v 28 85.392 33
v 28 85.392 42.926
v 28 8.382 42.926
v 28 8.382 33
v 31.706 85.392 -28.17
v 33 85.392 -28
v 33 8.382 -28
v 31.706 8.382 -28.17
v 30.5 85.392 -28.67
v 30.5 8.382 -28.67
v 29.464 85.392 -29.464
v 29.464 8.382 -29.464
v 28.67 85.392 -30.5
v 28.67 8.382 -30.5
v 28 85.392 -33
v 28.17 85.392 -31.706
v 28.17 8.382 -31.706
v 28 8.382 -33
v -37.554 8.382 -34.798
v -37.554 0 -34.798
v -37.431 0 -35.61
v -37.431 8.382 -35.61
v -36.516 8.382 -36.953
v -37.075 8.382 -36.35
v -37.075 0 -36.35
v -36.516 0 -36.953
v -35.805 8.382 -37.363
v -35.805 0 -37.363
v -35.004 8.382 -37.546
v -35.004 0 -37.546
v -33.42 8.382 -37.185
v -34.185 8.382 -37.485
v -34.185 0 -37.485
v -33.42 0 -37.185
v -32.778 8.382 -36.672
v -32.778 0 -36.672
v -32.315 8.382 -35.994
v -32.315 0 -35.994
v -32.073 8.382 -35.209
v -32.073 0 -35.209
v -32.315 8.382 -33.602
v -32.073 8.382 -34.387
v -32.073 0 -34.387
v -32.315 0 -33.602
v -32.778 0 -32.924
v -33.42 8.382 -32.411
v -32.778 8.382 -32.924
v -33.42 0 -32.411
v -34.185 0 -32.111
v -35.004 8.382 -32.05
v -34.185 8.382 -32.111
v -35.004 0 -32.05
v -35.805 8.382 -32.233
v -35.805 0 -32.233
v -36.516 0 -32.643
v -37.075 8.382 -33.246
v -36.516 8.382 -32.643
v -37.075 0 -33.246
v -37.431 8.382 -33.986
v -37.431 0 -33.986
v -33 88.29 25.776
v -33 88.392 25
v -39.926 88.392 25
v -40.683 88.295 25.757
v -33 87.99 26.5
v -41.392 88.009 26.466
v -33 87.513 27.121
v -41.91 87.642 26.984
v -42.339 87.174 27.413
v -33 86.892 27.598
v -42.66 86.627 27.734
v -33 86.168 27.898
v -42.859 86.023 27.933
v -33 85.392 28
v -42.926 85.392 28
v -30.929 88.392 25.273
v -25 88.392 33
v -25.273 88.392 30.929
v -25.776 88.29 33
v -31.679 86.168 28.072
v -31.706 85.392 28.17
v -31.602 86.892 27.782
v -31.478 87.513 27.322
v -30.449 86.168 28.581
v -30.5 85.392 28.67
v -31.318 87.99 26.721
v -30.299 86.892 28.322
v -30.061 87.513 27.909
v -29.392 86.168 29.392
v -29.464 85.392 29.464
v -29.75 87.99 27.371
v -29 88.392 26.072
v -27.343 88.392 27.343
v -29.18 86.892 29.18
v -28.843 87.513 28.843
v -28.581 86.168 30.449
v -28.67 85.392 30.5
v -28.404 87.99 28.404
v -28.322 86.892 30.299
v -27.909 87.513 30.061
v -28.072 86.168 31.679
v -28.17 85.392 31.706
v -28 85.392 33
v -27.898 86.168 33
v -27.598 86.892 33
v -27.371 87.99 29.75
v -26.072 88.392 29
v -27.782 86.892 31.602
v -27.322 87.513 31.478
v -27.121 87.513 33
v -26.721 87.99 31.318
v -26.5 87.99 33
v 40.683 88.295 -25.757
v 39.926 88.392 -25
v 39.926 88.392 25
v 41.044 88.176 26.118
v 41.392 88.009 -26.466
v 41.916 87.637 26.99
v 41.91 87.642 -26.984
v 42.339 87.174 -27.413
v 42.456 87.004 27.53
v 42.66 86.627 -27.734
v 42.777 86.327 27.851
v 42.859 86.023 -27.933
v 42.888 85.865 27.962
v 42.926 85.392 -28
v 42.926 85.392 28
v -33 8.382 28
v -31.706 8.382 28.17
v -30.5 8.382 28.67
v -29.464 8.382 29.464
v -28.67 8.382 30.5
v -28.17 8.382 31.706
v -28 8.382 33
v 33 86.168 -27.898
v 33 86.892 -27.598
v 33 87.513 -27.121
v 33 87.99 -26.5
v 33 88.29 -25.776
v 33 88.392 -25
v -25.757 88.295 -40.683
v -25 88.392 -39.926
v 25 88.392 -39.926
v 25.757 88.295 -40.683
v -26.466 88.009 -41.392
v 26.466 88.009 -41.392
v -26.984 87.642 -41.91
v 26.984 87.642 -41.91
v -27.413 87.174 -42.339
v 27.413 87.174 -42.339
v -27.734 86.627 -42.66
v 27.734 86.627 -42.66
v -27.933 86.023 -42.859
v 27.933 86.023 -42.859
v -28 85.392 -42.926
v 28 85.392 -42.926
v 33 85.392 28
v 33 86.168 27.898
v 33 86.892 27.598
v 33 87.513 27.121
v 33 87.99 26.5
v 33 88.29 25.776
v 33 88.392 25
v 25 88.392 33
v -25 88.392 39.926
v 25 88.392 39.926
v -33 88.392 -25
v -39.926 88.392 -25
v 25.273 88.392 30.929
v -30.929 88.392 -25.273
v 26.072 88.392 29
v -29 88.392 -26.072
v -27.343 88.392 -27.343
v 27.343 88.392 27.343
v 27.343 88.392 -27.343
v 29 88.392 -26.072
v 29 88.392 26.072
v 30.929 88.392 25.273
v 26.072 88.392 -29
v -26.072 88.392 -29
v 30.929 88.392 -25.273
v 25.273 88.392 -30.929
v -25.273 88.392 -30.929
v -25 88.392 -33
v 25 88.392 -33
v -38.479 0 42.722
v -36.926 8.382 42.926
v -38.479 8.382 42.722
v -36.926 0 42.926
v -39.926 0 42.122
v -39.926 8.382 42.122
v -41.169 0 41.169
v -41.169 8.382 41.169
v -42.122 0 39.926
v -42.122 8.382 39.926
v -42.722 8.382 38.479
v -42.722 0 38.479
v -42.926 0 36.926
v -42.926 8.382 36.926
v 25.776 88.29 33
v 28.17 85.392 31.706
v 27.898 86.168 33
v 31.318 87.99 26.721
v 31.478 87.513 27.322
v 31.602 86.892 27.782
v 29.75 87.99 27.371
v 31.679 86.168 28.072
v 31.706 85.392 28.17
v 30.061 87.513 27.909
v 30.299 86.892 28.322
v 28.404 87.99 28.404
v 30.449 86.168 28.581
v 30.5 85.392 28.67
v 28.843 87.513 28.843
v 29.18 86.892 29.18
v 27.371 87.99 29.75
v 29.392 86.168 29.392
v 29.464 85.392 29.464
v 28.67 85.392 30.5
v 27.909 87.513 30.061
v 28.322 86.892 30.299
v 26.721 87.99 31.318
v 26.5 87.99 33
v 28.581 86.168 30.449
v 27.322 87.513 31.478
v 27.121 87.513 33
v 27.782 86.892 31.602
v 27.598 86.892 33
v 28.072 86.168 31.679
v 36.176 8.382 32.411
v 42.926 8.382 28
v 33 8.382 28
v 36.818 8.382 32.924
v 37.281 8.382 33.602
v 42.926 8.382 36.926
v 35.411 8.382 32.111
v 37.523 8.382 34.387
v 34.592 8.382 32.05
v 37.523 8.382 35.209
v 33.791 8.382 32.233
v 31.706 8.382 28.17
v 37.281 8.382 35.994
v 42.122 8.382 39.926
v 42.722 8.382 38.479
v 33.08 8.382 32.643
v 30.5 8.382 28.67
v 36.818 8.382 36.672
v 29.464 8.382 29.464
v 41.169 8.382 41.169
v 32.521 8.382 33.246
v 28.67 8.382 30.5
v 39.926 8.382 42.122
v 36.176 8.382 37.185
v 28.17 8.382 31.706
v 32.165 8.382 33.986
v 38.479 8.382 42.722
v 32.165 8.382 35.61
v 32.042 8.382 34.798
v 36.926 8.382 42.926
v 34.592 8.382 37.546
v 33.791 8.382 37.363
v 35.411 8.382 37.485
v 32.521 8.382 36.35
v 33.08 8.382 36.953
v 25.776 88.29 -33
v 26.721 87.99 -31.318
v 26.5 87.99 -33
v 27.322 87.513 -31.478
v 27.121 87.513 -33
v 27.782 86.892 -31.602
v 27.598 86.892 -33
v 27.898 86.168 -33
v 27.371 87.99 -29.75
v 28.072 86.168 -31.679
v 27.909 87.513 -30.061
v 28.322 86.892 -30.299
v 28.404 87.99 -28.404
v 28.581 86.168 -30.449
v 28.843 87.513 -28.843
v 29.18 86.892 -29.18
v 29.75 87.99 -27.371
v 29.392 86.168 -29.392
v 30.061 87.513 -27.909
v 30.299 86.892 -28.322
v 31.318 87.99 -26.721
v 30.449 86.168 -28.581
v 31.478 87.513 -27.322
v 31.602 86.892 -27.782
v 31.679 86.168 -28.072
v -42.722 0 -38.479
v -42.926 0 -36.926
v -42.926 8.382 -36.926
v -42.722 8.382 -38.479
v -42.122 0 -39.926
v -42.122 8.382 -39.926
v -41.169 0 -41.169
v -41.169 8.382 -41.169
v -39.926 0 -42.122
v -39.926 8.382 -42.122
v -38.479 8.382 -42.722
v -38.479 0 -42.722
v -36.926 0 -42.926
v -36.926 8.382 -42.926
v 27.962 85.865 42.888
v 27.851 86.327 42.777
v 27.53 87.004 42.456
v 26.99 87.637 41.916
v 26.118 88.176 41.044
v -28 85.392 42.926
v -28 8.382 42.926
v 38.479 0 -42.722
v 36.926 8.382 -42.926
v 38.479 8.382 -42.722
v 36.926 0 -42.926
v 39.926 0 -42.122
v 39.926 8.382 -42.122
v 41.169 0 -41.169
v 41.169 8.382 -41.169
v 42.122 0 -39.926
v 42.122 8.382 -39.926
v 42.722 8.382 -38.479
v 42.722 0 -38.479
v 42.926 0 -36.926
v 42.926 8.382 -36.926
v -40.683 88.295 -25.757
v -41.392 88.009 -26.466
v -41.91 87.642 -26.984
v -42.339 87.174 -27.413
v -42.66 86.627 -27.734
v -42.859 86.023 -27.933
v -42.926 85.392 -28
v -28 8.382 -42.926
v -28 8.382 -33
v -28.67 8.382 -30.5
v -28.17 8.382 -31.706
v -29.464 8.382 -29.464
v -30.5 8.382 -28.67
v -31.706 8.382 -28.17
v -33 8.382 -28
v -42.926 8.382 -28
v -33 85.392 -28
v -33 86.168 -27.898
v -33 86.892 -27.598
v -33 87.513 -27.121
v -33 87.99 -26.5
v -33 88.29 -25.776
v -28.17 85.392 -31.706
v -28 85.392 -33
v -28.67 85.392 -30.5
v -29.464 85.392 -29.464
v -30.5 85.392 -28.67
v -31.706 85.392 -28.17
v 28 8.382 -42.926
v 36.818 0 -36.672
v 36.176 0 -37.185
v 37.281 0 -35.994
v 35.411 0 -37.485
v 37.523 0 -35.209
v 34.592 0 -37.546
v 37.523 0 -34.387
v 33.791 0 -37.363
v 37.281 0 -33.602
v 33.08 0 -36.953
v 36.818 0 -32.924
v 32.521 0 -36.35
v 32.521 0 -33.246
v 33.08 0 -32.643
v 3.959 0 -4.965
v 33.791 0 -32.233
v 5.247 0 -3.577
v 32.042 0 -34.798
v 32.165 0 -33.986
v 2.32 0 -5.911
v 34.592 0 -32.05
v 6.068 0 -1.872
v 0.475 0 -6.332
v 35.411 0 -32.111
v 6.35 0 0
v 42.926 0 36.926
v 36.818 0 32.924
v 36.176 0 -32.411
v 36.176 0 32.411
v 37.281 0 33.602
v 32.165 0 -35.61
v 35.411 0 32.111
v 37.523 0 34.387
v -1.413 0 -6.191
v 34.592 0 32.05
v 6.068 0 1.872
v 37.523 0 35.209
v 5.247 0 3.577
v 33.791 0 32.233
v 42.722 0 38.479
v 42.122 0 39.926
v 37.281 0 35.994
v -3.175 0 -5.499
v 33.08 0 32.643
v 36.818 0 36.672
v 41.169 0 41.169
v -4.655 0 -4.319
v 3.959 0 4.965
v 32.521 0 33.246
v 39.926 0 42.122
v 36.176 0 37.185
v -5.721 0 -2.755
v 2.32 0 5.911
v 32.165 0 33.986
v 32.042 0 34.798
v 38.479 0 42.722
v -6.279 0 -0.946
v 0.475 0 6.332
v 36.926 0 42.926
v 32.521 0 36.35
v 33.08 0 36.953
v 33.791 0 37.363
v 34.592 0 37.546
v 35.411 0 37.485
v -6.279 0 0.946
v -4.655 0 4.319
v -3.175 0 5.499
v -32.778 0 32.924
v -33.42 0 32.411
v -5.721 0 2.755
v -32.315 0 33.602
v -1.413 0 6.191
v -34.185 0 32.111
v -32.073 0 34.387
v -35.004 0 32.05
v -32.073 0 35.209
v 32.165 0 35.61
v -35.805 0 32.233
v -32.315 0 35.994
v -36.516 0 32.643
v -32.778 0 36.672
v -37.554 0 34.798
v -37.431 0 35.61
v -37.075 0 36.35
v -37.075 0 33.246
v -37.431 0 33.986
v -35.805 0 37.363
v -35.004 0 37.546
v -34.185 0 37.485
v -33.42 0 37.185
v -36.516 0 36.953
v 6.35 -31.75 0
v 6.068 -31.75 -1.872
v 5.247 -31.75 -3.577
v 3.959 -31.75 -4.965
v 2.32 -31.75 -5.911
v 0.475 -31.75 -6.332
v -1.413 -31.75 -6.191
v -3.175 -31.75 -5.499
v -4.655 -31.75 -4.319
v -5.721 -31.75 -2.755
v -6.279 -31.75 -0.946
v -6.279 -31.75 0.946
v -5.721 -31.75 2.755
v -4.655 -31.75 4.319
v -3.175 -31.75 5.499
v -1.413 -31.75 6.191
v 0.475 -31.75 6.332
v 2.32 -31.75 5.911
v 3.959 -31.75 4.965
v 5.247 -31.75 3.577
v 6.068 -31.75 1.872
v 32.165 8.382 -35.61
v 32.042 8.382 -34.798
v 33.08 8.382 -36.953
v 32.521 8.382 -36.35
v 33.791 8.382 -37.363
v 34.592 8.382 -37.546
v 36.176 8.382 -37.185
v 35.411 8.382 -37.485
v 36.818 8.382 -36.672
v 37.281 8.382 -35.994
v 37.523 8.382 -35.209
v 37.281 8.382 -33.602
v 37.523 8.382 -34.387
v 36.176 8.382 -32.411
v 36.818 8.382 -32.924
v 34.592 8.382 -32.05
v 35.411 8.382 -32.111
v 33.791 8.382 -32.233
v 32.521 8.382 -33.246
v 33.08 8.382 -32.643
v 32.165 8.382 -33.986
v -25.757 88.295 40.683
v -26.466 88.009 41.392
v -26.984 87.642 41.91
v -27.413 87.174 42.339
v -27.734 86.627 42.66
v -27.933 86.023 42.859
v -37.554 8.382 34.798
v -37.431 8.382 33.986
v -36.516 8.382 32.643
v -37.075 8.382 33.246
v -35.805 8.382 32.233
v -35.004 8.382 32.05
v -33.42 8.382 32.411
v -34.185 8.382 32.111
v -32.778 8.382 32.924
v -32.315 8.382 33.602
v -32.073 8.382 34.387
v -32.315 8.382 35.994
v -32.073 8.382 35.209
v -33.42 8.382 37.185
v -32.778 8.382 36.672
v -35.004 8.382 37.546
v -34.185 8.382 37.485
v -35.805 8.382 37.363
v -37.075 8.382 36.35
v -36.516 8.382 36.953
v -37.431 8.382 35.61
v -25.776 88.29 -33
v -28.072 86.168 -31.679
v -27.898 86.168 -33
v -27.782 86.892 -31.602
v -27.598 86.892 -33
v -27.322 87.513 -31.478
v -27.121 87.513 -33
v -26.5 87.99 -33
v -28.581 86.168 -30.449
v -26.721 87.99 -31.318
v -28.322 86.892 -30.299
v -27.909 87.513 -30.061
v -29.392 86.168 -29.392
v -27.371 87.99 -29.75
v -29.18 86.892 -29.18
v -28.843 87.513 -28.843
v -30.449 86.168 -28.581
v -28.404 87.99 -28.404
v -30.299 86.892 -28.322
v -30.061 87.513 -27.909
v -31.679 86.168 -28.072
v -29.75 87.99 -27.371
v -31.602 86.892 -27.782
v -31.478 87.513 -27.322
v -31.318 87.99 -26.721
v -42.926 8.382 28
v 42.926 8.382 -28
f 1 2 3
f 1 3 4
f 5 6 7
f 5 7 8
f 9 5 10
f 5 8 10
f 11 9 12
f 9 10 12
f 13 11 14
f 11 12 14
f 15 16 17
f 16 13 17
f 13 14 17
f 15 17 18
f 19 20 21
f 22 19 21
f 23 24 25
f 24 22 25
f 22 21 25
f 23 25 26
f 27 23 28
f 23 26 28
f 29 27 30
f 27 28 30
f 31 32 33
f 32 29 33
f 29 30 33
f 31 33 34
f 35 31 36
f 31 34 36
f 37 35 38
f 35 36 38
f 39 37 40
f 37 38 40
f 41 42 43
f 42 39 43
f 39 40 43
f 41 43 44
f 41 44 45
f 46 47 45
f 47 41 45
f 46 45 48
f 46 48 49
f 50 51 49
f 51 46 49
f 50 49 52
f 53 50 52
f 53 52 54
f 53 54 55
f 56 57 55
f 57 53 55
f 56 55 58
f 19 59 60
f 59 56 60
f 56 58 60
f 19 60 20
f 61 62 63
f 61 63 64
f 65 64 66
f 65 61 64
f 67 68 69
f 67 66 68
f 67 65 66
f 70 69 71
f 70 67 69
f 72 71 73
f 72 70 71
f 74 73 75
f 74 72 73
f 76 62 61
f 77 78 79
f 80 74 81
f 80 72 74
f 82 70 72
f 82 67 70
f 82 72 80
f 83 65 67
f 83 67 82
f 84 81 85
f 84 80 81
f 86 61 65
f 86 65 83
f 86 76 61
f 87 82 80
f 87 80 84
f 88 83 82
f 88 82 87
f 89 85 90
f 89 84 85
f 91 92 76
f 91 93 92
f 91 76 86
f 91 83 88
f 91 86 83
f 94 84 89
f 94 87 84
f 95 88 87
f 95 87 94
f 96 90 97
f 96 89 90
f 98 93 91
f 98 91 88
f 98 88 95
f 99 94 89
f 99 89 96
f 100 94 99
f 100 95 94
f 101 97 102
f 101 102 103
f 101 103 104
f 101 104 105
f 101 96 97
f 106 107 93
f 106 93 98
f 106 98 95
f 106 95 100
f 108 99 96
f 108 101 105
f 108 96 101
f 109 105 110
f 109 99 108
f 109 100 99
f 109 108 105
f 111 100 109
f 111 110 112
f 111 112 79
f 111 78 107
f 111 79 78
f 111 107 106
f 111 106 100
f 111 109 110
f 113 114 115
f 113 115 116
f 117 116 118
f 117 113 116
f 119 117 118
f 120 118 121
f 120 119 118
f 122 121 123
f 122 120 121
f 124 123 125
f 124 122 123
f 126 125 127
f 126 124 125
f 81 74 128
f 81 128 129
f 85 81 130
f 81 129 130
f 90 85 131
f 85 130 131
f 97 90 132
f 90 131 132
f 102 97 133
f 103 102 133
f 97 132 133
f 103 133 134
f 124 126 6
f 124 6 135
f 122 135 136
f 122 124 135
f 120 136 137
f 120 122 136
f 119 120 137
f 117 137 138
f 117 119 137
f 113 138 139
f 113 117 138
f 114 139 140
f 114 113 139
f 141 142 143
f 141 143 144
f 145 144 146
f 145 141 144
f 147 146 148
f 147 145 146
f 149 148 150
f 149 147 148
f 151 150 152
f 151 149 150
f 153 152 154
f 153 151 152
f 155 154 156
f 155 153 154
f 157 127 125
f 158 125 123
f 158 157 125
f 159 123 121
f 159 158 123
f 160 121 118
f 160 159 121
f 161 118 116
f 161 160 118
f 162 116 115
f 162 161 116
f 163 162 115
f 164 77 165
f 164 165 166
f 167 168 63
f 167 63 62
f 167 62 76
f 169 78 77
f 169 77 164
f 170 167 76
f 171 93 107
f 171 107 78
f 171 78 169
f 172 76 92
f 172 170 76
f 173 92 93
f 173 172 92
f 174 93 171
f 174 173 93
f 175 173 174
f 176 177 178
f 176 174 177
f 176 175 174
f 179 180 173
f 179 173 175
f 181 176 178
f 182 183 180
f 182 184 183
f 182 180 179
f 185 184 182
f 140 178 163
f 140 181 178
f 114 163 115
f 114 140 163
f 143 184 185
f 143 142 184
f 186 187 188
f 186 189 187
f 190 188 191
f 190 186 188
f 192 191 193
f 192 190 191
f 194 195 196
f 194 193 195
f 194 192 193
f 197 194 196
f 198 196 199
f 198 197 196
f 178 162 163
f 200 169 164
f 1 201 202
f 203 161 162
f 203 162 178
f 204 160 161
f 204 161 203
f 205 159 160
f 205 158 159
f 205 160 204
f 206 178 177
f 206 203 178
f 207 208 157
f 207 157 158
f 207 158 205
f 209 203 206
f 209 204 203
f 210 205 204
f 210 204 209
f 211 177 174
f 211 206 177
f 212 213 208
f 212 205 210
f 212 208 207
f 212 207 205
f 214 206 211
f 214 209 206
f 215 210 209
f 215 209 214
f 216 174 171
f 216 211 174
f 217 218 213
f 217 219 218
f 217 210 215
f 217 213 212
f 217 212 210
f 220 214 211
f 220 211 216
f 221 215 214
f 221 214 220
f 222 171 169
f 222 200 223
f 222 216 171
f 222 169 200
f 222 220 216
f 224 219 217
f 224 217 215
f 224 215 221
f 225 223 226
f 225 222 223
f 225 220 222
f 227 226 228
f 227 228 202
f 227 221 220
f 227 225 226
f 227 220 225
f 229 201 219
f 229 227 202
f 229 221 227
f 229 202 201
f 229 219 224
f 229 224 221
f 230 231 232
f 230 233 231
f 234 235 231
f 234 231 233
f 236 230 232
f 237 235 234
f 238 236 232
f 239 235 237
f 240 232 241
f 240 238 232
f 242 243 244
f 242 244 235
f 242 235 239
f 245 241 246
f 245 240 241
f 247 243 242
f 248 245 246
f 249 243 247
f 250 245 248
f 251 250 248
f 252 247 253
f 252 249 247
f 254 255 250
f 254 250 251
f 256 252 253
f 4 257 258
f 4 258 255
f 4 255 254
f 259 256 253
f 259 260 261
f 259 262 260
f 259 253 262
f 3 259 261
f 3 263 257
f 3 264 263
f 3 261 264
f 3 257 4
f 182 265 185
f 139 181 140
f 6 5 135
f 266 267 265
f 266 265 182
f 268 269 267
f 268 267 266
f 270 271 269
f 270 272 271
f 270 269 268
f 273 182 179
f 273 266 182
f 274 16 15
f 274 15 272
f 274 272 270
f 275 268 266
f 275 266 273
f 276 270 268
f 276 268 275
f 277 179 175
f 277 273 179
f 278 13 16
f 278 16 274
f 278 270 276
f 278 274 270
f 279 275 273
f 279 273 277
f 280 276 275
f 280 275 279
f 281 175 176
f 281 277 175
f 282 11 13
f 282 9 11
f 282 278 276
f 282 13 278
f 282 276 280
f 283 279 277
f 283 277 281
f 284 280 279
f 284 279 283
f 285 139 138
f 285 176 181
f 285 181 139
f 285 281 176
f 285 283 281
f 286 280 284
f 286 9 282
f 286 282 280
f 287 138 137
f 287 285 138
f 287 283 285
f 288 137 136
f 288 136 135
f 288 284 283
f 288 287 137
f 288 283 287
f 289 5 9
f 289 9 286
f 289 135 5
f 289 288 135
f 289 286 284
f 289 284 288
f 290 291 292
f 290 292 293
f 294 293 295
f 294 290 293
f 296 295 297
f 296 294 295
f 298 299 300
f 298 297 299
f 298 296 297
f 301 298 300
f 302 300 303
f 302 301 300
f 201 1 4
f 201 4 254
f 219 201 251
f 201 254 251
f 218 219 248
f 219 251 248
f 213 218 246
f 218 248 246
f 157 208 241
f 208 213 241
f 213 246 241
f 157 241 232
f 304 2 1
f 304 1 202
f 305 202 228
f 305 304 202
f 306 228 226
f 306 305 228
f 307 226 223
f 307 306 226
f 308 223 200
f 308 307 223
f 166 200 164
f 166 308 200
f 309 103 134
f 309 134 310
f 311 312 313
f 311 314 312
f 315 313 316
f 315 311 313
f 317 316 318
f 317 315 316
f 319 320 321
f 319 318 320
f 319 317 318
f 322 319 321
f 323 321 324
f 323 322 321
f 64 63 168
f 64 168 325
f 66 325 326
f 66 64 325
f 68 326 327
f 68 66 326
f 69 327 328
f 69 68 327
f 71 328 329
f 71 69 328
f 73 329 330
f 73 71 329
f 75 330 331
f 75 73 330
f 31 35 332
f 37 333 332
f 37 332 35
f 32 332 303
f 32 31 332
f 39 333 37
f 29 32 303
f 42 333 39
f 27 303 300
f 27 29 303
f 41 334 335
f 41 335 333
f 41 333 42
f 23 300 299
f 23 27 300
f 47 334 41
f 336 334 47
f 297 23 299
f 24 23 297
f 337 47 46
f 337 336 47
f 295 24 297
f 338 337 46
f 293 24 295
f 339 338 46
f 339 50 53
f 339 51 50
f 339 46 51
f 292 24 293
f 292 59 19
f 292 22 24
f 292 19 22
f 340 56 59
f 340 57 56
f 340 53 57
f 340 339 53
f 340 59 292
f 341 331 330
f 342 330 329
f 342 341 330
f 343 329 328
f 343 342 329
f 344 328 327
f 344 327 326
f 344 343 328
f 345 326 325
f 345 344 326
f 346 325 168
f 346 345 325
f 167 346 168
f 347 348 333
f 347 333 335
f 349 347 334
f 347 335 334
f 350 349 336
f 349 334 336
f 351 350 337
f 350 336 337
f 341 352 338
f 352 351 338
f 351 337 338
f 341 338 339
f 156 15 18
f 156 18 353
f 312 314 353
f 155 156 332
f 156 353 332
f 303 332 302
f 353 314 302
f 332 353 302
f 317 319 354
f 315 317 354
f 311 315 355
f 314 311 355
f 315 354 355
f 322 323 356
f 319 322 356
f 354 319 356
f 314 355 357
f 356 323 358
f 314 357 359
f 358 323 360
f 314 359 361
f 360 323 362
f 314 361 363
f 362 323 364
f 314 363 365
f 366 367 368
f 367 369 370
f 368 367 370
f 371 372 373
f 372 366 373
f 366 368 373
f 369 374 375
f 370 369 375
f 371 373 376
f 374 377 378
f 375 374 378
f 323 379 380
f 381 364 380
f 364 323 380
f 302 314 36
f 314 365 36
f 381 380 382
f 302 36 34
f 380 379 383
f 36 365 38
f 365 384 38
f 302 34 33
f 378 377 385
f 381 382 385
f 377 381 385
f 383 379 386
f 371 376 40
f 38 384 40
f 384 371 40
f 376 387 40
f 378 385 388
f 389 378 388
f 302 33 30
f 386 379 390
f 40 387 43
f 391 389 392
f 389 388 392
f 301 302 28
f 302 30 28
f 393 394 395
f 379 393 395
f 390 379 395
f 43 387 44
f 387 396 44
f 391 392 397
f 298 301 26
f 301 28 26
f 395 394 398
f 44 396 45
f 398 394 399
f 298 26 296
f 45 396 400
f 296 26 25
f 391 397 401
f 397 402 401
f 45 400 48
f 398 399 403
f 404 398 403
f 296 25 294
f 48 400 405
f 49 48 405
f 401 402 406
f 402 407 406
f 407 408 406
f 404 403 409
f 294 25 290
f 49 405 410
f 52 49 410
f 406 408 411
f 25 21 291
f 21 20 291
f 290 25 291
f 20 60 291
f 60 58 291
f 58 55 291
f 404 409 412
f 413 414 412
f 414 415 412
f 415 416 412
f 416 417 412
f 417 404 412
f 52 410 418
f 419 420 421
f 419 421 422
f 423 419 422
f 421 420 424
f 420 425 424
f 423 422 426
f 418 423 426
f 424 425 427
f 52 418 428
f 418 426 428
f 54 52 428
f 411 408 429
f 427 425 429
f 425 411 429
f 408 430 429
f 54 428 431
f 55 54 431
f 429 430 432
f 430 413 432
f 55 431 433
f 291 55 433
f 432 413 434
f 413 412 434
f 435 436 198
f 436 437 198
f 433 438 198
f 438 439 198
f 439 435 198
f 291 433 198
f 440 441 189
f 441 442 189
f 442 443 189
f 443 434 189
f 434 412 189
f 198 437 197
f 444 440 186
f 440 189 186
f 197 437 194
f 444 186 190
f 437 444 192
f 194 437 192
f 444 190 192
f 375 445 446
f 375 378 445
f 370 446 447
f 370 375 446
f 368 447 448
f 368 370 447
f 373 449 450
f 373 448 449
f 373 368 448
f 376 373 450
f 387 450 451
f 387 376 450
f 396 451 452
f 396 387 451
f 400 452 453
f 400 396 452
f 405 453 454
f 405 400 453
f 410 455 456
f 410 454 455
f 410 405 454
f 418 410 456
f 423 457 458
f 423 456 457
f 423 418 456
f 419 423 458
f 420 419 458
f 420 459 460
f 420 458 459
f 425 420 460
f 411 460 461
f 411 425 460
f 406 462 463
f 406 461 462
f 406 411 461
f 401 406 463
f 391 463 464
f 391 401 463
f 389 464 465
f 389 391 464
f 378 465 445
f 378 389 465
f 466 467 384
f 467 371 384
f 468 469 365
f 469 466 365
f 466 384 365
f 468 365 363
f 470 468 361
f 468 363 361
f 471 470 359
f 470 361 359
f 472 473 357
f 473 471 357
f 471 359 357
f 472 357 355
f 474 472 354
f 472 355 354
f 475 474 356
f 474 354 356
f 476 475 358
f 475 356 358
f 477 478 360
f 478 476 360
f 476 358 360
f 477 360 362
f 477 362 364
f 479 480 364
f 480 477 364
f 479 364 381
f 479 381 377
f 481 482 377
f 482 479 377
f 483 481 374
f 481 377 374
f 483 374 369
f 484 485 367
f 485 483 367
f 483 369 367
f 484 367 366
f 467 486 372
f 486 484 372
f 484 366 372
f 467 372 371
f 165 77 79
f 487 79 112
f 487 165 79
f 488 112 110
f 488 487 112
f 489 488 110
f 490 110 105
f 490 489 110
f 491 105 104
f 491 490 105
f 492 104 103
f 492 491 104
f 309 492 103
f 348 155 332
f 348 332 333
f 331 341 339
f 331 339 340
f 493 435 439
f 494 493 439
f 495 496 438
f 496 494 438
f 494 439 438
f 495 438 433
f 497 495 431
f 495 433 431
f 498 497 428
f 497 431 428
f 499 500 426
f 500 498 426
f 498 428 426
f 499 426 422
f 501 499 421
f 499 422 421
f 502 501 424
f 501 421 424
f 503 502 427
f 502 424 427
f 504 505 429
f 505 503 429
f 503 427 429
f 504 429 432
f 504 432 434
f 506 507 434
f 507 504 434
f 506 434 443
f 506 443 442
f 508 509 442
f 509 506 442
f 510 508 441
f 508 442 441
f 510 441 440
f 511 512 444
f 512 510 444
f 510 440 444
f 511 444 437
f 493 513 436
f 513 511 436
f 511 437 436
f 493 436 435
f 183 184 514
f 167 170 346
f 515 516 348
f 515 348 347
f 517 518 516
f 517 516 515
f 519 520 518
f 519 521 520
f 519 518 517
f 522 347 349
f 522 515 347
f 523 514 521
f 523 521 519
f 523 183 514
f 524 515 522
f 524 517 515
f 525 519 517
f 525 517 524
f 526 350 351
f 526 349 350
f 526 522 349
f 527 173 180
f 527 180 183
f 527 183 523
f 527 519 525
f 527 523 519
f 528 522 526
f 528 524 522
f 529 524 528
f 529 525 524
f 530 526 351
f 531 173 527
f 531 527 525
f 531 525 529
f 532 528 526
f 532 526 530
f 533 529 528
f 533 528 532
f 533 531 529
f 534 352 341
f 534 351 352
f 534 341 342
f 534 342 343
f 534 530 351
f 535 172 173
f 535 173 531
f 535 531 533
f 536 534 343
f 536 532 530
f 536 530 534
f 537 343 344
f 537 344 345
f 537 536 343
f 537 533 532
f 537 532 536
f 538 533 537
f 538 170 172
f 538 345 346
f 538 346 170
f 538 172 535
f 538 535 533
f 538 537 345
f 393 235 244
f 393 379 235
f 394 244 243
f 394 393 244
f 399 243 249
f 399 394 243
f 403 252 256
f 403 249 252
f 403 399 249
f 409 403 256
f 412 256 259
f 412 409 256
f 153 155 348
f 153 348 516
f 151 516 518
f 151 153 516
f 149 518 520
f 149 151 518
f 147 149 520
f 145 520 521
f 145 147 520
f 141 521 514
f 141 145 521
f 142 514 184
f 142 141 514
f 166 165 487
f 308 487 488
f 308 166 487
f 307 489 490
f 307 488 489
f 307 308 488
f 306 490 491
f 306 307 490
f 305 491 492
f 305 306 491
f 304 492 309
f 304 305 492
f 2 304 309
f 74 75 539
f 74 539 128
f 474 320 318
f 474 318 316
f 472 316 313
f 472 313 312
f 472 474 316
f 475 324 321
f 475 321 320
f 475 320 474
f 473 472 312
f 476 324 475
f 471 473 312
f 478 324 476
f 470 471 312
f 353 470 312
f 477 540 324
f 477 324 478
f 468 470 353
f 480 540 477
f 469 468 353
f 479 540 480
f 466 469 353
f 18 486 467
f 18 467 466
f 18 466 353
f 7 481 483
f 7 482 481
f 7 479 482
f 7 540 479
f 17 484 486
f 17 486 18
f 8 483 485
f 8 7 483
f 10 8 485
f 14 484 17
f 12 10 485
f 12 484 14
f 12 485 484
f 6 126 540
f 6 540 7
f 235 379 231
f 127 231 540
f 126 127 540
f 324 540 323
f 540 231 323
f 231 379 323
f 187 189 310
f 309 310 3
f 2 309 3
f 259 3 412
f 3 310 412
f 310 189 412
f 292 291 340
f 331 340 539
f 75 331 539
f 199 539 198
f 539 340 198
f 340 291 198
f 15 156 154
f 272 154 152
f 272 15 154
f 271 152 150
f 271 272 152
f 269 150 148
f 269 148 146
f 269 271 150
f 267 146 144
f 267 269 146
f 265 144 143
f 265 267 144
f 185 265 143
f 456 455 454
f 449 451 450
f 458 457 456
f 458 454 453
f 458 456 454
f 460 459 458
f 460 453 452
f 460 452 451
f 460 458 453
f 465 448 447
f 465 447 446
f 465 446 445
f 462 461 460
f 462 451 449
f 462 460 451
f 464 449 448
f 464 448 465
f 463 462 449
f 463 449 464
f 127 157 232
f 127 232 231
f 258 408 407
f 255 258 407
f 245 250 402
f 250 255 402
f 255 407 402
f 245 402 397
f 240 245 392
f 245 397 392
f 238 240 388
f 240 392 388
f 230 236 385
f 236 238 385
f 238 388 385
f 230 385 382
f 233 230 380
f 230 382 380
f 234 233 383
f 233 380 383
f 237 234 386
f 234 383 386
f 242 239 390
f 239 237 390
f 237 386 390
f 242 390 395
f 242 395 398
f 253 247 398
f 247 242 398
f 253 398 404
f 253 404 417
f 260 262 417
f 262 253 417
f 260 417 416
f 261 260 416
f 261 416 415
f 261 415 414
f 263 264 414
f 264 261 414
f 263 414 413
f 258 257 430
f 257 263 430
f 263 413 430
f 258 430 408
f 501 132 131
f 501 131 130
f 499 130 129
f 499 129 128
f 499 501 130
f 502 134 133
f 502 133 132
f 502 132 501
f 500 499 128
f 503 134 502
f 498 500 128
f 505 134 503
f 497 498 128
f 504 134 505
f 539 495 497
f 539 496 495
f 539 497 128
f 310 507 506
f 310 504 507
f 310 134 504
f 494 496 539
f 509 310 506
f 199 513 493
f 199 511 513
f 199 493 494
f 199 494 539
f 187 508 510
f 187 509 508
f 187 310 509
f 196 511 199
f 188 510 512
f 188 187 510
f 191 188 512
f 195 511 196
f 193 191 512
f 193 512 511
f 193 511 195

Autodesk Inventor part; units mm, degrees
ref_plane "YZ Plane" through (0, 0, 0) normal (1, 0, 0) x (0, 1, 0)
ref_plane "XZ Plane" through (0, 0, 0) normal (0, 1, 0) x (-1, 0, 0)
ref_plane "XY Plane" through (0, 0, 0) normal (0, 0, 1) x (1, 0, 0)
sketch "Sketch1" plane through (0, 0, 0) normal (0, 1, 0) x (-1, 0, 0)
  line L0 (36.926, 42.926) -> (-36.926, 42.926)
  line L1 (-42.926, 36.926) -> (-42.926, -36.926)
  line L2 (-36.926, -42.926) -> (36.926, -42.926)
  line L3 (42.926, -36.926) -> (42.926, 36.926)
  line L4 (55, 0) -> (-75, 0) construction
  line L5 (0, 74) -> (0, -88) construction
  arc A0 (42.926, 36.926) -> (36.926, 42.926) centre (36.926, 36.926) ccw
  arc A1 (36.926, -42.926) -> (42.926, -36.926) centre (36.926, -36.926) ccw
  arc A2 (-42.926, -36.926) -> (-36.926, -42.926) centre (-36.926, -36.926) ccw
  arc A3 (-36.926, 42.926) -> (-42.926, 36.926) centre (-36.926, 36.926) ccw
  circle A4 centre (34.798, 34.798) radius 2.7559
  circle A5 centre (34.798, -34.798) radius 2.7559
  circle A6 centre (-34.798, -34.798) radius 2.7559
  circle A7 centre (-34.798, 34.798) radius 2.7559
  point P0 (0, 0)
  point P1 (42.926, 42.926)
  point P2 (42.926, -42.926)
  point P3 (42.926, 0)
  point P4 (0, -42.926)
  dimension "d0" = 85.852
  dimension "d1" = 6
  dimension "d5" = 5.5118
  dimension "d6" = 69.596
  dimension "d7" = 69.596
  dimension "d8" = 69.596
  dimension "d9" = 69.596
  dimension "d10" = 34.798
  dimension "d11" = 34.798
extrude "Extrusion1" add sketch "Sketch1" along normal blind 8.382
sketch "Sketch2" plane through (0, 8.382, 0) normal (0, 1, 0) x (1, 0, 0)
  line L0 (42.926, -28) -> (42.926, 28)
  line L1 (-42.926, 28) -> (-42.926, -28)
  line L2 (-28, -42.926) -> (28, -42.926)
  line L3 (28, 42.926) -> (-28, 42.926)
  line L4 (-42.926, 36.926) -> (-42.926, -36.926) projected
  line L5 (36.926, 42.926) -> (-36.926, 42.926) projected
  line L6 (42.926, -36.926) -> (42.926, 36.926) projected
  line L7 (-36.926, -42.926) -> (36.926, -42.926) projected
  line L8 (-42.926, -28) -> (-33, -28)
  line L9 (33, -28) -> (42.926, -28)
  line L10 (-28, 42.926) -> (-28, 33)
  line L11 (-28, -33) -> (-28, -42.926)
  line L12 (42.926, 28) -> (33, 28)
  line L13 (-33, 28) -> (-42.926, 28)
  line L14 (28, -42.926) -> (28, -33)
  line L15 (28, 33) -> (28, 42.926)
  arc A0 (33, -28) -> (28, -33) centre (33, -33) ccw
  arc A1 (-28, -33) -> (-33, -28) centre (-33, -33) ccw
  arc A2 (-33, 28) -> (-28, 33) centre (-33, 33) ccw
  arc A3 (28, 33) -> (33, 28) centre (33, 33) ccw
  point P0 (0, 0)
  dimension "d14" = 56
  dimension "d16" = 56
  dimension "d18" = 5
  dimension "d30" = 28
  dimension "d31" = 28
extrude "Extrusion2" add sketch "Sketch2" along normal blind 80.01
fillet "Fillet1" radius 3 16 edges at (29.4645, 88.392, 29.4645) (28, 88.392, 37.963) (37.963, 88.392, 28) (42.926, 88.392, 0) (0, 88.392, -42.926) (-42.926, 88.392, 0) (-28, 88.392, 37.963) (-37.963, 88.392, 28) (-29.4645, 88.392, 29.4645) (0, 88.392, 42.926) (29.4645, 88.392, -29.4645) (28, 88.392, -37.963) (37.963, 88.392, -28) (-29.4645, 88.392, -29.4645) (-28, 88.392, -37.963) (-37.963, 88.392, -28)
sketch "Sketch3" plane through (0, 0, 0) normal (0, -1, 0) x (1, 0, 0)
  circle A0 centre (0, 0) radius 6.35
  dimension "d22" = 12.7
extrude "Extrusion3" add sketch "Sketch3" along normal blind 31.75
properties part number "1224_Stepper Motor_V1"
